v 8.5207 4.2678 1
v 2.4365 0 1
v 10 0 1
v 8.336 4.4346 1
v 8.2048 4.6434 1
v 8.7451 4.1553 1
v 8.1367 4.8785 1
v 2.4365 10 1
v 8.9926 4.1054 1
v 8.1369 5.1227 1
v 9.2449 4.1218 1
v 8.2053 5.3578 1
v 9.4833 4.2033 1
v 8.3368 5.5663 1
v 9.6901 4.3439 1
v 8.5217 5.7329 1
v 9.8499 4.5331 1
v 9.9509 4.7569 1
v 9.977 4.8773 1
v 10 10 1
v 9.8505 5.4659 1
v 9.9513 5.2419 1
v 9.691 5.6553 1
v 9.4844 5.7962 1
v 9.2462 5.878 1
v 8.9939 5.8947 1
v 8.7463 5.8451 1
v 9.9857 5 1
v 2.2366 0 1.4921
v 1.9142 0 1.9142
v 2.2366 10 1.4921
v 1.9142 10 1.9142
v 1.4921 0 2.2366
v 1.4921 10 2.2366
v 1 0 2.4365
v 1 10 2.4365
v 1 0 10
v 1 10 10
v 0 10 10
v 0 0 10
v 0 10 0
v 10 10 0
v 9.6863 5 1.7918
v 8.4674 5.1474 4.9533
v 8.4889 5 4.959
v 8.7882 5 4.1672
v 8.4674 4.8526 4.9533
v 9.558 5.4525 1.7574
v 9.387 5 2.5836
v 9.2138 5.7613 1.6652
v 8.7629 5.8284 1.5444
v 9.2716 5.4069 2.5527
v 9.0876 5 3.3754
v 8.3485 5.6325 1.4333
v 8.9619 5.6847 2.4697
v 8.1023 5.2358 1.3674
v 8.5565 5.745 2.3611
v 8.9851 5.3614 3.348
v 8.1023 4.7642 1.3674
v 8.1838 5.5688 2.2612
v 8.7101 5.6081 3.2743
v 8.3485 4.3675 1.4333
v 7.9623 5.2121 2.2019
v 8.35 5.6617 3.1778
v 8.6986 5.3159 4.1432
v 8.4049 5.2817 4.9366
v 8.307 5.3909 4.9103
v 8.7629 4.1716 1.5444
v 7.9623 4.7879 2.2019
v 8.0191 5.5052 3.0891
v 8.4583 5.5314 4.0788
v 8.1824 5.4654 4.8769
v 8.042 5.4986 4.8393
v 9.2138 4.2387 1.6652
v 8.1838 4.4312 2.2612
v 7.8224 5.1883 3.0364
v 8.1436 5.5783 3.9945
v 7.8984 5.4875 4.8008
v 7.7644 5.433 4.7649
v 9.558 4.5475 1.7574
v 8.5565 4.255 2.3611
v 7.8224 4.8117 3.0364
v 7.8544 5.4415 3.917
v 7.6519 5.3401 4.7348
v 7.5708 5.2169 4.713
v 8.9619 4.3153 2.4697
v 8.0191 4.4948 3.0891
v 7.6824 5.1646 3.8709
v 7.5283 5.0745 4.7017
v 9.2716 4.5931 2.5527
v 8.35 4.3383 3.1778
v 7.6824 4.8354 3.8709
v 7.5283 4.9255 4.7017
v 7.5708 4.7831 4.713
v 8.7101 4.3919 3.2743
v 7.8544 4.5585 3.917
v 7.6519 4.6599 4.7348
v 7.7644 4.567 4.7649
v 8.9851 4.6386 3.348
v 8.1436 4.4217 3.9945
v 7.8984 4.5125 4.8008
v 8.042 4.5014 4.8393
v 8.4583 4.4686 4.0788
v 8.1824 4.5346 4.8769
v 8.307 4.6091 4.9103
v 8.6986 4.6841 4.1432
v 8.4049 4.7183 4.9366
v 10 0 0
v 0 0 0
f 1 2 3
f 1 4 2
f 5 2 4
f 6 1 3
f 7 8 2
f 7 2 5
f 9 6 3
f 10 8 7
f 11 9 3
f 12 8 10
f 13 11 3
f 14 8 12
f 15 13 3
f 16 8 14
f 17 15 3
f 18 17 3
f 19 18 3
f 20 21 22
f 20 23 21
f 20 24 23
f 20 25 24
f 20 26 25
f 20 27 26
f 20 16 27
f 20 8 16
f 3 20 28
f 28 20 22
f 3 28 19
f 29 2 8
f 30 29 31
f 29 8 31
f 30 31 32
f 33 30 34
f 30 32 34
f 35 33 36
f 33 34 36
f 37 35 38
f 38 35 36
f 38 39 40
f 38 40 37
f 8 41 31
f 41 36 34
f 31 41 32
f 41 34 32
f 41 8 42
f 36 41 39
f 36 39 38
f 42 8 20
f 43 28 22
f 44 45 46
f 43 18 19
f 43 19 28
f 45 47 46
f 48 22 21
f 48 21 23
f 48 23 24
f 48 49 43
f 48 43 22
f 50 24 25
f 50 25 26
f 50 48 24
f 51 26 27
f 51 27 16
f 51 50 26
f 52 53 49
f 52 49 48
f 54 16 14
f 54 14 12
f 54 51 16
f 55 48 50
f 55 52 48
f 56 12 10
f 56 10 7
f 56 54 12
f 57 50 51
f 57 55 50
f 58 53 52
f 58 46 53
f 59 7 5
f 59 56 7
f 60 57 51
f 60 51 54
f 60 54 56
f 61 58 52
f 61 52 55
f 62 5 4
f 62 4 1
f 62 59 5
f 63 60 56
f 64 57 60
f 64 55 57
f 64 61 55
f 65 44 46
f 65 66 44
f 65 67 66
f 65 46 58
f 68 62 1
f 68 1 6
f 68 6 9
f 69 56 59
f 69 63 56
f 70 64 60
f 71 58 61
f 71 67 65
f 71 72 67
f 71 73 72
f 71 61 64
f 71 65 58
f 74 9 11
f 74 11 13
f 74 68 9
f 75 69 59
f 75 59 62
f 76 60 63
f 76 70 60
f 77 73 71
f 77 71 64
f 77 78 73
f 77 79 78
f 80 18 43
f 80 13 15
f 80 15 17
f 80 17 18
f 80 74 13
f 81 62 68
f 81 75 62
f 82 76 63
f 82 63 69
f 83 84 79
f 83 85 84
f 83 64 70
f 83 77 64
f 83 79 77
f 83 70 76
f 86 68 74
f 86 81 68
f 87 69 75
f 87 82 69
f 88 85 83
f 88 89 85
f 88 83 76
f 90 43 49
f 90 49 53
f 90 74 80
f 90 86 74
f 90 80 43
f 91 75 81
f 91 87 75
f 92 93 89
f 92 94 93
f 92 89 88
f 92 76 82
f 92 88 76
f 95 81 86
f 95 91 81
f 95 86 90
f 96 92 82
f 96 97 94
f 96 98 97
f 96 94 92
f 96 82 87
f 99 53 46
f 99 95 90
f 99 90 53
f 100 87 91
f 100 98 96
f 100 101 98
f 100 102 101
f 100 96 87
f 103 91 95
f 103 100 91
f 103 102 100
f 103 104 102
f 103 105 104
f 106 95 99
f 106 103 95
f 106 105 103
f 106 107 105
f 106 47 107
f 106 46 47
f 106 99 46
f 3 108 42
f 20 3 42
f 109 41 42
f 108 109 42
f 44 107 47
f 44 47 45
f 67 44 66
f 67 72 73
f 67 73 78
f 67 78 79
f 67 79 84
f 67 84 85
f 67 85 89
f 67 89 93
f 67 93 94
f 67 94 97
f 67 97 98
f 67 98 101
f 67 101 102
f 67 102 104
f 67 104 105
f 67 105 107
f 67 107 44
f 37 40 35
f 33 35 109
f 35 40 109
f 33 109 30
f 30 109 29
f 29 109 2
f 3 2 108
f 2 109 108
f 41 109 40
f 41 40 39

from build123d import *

# Parameters (mm, degrees)
BOX002_W            = 15
BOX002_H            = 10
BOX002_DEPTH        = 2
BOX003_W            = 3
BOX003_H            = 10
BOX003_DEPTH        = 10
BOX004_W            = 2
BOX004_H            = 10
BOX004_DEPTH        = 1
BOX001_W            = 1
BOX001_H            = 10
BOX001_DEPTH        = 10
CONE_PITCH_ANGLE    = -15
CYLINDER_R          = 2
CYLINDER_DEPTH      = 10
CYLINDER_ROLL_ANGLE = 90
BOX_W               = 10
BOX_H               = 10
BOX_DEPTH           = 1


with BuildPart() as cubo002:
    # Box002 → Box002 (new body)
    with BuildSketch(Plane(origin=(-3, 0, -2), x_dir=(1, 0, 0), z_dir=(0, 0, 1))):
        with Locations((7.5, 5)):
            Rectangle(BOX002_W, BOX002_H)
    extrude(amount=BOX002_DEPTH)


with BuildPart() as cubo003:
    # Box003 → Box003 (new body)
    with BuildSketch(Plane(origin=(-3, 0, 0), x_dir=(1, 0, 0), z_dir=(0, 0, 1))):
        with Locations((1.5, 5)):
            Rectangle(BOX003_W, BOX003_H)
    extrude(amount=BOX003_DEPTH)


with BuildPart() as cubo004:
    # Box004 → Box004 (new body)
    with BuildSketch(Plane(origin=(10, 0, 0), x_dir=(1, 0, 0), z_dir=(0, 0, 1))):
        with Locations((1, 5)):
            Rectangle(BOX004_W, BOX004_H)
    extrude(amount=BOX004_DEPTH)


with BuildPart() as cubo001:
    # Box001 → Box001 (new body)
    with BuildSketch(Plane.XY):
        with Locations((0.5, 5)):
            Rectangle(BOX001_W, BOX001_H)
    extrude(amount=BOX001_DEPTH)


with BuildPart() as cono:
    # Cone → Cone (revolve)
    with BuildSketch(Plane.XZ):
        Polygon((0, 0), (1, 0), (0.5, 5), (0, 5), align=None)
    revolve(axis=Axis((0, 0, 0), (0, 0, 1)))


with BuildPart() as cono_1:
    # Cone pitch: moved
    add(cono.part.rotate(Axis((0, 0, 0), (0, 1, 0)), CONE_PITCH_ANGLE))


with BuildPart() as cono_2:
    # Cone placement: moved
    add(cono_1.part.moved(Location((9.3, 5, 0))))


with BuildPart() as cilindro:
    # Cylinder → Cylinder (new body)
    with BuildSketch(Plane.XY):
        Circle(CYLINDER_R)
    extrude(amount=CYLINDER_DEPTH)


with BuildPart() as cilindro_1:
    # Cylinder roll: moved
    add(cilindro.part.rotate(Axis((0, 0, 0), (1, 0, 0)), CYLINDER_ROLL_ANGLE))


with BuildPart() as cilindro_2:
    # Cylinder placement: moved
    add(cilindro_1.part.moved(Location((0.5, 10, 0.5))))


with BuildPart() as cut002:
    # Box → Box (new body)
    with BuildSketch(Plane.XY):
        with Locations((5, 5)):
            Rectangle(BOX_W, BOX_H)
    extrude(amount=BOX_DEPTH)

    # Fusion: union Cubo001, Cono, Cilindro
    add(cubo001.part)
    add(cono_2.part)
    add(cilindro_2.part)

    # Cut: cut Cubo004
    add(cubo004.part, mode=Mode.SUBTRACT)

    # Cut001: cut Cubo003
    add(cubo003.part, mode=Mode.SUBTRACT)

    # Cut002: cut Cubo002
    add(cubo002.part, mode=Mode.SUBTRACT)


solid = cut002.part
